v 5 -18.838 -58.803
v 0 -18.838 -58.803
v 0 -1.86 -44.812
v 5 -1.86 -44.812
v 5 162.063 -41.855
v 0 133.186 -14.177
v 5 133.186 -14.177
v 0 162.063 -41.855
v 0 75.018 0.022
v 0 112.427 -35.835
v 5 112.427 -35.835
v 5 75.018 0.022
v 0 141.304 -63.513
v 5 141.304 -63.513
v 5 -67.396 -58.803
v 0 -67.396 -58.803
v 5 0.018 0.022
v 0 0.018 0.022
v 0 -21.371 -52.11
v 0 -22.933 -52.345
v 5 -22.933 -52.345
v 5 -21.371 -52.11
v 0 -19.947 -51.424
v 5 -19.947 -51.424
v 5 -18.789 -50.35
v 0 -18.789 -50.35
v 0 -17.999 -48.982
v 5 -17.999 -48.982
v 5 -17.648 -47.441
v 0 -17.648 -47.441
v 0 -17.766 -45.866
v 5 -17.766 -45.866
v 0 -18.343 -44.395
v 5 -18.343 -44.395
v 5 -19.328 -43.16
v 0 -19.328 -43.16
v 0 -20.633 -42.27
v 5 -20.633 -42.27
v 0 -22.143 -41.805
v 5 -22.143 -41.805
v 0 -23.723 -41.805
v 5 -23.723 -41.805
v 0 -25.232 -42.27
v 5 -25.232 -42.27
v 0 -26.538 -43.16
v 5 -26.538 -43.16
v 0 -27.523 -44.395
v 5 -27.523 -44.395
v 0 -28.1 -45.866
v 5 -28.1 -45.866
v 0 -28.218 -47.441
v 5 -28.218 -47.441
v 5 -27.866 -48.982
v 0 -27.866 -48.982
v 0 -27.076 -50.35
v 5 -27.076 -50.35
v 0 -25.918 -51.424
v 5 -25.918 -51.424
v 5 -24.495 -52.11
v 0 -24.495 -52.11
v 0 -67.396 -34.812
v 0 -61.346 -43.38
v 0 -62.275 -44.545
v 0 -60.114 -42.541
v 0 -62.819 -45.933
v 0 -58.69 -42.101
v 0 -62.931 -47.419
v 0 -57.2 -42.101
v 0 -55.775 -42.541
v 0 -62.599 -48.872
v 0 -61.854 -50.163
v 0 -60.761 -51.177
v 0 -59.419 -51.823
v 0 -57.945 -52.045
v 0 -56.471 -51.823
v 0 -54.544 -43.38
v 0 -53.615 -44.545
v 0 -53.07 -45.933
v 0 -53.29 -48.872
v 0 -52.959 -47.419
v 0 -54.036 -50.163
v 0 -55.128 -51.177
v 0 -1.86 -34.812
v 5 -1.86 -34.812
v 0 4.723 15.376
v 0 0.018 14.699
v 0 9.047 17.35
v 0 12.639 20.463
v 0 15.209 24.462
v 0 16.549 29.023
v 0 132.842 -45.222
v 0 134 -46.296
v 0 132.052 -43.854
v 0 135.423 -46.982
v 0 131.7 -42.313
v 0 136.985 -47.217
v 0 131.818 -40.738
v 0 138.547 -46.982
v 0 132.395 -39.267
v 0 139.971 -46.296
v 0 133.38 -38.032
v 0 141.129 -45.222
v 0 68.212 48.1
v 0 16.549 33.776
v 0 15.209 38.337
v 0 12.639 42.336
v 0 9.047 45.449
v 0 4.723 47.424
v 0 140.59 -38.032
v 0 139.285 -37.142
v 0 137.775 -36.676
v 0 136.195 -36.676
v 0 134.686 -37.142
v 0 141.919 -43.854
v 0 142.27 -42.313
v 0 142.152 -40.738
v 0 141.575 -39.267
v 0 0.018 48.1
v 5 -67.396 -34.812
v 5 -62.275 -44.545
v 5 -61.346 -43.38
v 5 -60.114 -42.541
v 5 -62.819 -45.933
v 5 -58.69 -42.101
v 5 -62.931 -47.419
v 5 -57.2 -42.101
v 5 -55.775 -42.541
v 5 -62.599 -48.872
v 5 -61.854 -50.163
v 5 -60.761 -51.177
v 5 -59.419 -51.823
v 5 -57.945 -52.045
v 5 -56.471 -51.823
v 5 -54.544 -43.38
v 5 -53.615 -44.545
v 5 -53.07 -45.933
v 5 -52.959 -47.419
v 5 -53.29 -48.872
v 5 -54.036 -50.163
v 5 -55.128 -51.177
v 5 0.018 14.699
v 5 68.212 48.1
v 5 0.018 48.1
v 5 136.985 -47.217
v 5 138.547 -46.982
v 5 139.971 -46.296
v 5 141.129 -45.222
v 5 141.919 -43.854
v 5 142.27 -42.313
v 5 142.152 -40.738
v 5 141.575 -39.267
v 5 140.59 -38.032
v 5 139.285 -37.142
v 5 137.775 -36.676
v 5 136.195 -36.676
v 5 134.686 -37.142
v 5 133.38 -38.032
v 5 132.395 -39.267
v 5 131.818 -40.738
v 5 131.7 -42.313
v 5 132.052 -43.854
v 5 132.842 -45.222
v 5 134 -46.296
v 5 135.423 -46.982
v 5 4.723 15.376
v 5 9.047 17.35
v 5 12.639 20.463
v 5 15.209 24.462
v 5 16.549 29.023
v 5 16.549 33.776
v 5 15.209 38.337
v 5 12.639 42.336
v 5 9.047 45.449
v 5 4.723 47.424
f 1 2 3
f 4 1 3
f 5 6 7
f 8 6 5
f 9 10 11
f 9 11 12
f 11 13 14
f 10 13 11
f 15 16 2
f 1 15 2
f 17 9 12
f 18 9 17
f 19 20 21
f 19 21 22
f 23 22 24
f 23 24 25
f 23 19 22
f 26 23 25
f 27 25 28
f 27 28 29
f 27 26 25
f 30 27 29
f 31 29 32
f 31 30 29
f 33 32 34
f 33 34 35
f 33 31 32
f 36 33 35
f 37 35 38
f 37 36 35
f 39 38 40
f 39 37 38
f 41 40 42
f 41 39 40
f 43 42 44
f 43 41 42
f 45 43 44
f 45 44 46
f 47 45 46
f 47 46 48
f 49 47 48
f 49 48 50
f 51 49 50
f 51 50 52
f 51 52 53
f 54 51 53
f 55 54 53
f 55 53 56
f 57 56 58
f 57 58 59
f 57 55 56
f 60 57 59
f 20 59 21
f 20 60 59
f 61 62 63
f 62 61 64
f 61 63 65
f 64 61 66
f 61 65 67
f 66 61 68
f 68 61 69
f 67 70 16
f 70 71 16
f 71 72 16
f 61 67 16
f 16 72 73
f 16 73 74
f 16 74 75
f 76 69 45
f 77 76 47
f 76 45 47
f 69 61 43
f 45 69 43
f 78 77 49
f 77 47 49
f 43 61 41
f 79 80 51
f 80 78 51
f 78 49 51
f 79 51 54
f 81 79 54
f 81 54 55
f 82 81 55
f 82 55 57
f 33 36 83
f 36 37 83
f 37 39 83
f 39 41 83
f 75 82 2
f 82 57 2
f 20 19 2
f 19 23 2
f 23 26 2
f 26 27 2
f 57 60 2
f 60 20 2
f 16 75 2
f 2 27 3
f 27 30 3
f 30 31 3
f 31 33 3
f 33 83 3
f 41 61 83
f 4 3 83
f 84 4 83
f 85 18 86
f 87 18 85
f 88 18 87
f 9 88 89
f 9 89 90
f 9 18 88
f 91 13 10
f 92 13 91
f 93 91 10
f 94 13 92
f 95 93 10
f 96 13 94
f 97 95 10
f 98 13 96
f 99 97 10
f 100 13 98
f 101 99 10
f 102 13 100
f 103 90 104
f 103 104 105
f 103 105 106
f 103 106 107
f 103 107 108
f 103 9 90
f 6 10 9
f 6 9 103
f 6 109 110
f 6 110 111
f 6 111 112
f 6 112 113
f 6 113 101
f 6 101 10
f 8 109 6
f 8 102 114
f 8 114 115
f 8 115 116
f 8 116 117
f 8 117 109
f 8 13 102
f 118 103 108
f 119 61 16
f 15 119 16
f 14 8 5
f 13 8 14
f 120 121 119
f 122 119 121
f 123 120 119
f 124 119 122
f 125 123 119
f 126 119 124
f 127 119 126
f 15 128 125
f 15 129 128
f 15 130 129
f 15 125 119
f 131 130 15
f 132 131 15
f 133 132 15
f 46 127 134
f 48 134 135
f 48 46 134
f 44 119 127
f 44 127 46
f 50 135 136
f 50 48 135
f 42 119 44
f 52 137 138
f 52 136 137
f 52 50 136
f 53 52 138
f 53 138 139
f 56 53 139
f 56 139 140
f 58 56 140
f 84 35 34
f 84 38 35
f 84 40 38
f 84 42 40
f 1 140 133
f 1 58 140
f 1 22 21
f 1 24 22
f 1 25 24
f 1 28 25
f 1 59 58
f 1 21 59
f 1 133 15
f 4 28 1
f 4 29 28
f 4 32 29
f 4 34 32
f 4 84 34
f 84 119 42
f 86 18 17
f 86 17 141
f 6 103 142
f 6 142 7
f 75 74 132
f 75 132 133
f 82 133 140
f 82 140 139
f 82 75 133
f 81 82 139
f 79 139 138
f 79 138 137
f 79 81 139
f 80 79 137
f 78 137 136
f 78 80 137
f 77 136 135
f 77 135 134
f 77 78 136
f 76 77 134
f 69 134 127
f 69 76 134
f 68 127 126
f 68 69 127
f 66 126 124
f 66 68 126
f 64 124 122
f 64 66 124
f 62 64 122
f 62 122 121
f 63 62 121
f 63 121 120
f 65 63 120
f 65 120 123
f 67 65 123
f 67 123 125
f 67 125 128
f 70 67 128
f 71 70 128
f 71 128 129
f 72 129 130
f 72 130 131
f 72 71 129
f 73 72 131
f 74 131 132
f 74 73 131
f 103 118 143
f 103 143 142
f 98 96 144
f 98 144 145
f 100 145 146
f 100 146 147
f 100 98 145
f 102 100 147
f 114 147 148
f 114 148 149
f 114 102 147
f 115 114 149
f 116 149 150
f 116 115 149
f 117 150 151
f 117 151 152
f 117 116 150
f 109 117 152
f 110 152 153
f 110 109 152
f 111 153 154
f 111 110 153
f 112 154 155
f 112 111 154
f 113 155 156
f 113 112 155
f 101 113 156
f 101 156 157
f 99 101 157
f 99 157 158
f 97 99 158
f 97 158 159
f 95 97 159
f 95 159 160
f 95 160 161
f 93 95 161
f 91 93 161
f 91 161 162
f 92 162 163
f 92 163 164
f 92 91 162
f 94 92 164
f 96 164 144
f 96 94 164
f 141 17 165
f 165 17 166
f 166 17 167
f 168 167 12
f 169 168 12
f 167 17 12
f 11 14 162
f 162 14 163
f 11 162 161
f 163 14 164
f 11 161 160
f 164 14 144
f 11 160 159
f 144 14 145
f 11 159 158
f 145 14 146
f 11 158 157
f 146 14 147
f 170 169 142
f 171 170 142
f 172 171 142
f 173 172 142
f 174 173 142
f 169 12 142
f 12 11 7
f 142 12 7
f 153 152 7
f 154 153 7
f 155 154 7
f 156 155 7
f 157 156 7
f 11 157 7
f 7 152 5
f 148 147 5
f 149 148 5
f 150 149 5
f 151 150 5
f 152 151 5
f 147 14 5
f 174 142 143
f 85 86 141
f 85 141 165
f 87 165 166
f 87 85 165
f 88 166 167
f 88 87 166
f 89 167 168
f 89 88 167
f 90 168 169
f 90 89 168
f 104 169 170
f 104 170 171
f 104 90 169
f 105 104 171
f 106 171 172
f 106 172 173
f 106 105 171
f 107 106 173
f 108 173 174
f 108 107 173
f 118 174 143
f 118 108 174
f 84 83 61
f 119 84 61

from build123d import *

# Parameters (mm, degrees)
CROQUIS1_R                = 5.3
SALIENTE_EXTRUIR1_DEPTH   = 5
CROQUIS1_R_2              = 5
SALIENTE_EXTRUIR1_2_DEPTH = 5


with BuildPart() as part:
    # Croquis1 → Saliente-Extruir1 (new body)
    with BuildSketch(Plane(origin=(0, 0, 0), x_dir=(0, 0, -1), z_dir=(1, 0, 0))):
        with BuildLine():
            Line((63.513171272, 141.30430007), (35.834565908, 112.427063272))
            Line((35.834565908, 112.427063272), (-0.021736706, 75.017991259))
            Line((-0.021736706, 75.017991259), (-0.021736706, 0.017991259))
            Line((-0.021736706, 0.017991259), (-14.69922376, 0.017991259))
            ThreePointArc((-14.69922376, 0.017991259), (-31.39972376, 16.718491259), (-48.10022376, 0.017991259))
            Line((-48.10022376, 0.017991259), (-48.10022376, 68.212234499))
            Line((-48.10022376, 68.212234499), (14.176638309, 133.186017295))
            Line((14.176638309, 133.186017295), (41.855243673, 162.063254093))
            Line((41.855243673, 162.063254093), (63.513171272, 141.30430007))
        make_face()
        with Locations((41.917193234, 136.985296196)):
            Circle(CROQUIS1_R, mode=Mode.SUBTRACT)
    extrude(amount=SALIENTE_EXTRUIR1_DEPTH)


with BuildPart() as body_2:
    # Croquis1 → Saliente-Extruir1 2 (new body)
    with BuildSketch(Plane(origin=(0, 0, 0), x_dir=(0, 0, -1), z_dir=(1, 0, 0))):
        Polygon((58.80261038, -67.395595521), (58.80261038, -18.837819707), (44.811911953, -1.859587834), (34.811911953, -1.859587834), (34.811911953, -67.395595521), align=None)
        with Locations((47.045373173, -22.932733847)):
            Circle(CROQUIS1_R, mode=Mode.SUBTRACT)
        with Locations((47.045373173, -57.944775054)):
            Circle(CROQUIS1_R_2, mode=Mode.SUBTRACT)
    extrude(amount=SALIENTE_EXTRUIR1_2_DEPTH)


solid = Compound([part.part, body_2.part])
